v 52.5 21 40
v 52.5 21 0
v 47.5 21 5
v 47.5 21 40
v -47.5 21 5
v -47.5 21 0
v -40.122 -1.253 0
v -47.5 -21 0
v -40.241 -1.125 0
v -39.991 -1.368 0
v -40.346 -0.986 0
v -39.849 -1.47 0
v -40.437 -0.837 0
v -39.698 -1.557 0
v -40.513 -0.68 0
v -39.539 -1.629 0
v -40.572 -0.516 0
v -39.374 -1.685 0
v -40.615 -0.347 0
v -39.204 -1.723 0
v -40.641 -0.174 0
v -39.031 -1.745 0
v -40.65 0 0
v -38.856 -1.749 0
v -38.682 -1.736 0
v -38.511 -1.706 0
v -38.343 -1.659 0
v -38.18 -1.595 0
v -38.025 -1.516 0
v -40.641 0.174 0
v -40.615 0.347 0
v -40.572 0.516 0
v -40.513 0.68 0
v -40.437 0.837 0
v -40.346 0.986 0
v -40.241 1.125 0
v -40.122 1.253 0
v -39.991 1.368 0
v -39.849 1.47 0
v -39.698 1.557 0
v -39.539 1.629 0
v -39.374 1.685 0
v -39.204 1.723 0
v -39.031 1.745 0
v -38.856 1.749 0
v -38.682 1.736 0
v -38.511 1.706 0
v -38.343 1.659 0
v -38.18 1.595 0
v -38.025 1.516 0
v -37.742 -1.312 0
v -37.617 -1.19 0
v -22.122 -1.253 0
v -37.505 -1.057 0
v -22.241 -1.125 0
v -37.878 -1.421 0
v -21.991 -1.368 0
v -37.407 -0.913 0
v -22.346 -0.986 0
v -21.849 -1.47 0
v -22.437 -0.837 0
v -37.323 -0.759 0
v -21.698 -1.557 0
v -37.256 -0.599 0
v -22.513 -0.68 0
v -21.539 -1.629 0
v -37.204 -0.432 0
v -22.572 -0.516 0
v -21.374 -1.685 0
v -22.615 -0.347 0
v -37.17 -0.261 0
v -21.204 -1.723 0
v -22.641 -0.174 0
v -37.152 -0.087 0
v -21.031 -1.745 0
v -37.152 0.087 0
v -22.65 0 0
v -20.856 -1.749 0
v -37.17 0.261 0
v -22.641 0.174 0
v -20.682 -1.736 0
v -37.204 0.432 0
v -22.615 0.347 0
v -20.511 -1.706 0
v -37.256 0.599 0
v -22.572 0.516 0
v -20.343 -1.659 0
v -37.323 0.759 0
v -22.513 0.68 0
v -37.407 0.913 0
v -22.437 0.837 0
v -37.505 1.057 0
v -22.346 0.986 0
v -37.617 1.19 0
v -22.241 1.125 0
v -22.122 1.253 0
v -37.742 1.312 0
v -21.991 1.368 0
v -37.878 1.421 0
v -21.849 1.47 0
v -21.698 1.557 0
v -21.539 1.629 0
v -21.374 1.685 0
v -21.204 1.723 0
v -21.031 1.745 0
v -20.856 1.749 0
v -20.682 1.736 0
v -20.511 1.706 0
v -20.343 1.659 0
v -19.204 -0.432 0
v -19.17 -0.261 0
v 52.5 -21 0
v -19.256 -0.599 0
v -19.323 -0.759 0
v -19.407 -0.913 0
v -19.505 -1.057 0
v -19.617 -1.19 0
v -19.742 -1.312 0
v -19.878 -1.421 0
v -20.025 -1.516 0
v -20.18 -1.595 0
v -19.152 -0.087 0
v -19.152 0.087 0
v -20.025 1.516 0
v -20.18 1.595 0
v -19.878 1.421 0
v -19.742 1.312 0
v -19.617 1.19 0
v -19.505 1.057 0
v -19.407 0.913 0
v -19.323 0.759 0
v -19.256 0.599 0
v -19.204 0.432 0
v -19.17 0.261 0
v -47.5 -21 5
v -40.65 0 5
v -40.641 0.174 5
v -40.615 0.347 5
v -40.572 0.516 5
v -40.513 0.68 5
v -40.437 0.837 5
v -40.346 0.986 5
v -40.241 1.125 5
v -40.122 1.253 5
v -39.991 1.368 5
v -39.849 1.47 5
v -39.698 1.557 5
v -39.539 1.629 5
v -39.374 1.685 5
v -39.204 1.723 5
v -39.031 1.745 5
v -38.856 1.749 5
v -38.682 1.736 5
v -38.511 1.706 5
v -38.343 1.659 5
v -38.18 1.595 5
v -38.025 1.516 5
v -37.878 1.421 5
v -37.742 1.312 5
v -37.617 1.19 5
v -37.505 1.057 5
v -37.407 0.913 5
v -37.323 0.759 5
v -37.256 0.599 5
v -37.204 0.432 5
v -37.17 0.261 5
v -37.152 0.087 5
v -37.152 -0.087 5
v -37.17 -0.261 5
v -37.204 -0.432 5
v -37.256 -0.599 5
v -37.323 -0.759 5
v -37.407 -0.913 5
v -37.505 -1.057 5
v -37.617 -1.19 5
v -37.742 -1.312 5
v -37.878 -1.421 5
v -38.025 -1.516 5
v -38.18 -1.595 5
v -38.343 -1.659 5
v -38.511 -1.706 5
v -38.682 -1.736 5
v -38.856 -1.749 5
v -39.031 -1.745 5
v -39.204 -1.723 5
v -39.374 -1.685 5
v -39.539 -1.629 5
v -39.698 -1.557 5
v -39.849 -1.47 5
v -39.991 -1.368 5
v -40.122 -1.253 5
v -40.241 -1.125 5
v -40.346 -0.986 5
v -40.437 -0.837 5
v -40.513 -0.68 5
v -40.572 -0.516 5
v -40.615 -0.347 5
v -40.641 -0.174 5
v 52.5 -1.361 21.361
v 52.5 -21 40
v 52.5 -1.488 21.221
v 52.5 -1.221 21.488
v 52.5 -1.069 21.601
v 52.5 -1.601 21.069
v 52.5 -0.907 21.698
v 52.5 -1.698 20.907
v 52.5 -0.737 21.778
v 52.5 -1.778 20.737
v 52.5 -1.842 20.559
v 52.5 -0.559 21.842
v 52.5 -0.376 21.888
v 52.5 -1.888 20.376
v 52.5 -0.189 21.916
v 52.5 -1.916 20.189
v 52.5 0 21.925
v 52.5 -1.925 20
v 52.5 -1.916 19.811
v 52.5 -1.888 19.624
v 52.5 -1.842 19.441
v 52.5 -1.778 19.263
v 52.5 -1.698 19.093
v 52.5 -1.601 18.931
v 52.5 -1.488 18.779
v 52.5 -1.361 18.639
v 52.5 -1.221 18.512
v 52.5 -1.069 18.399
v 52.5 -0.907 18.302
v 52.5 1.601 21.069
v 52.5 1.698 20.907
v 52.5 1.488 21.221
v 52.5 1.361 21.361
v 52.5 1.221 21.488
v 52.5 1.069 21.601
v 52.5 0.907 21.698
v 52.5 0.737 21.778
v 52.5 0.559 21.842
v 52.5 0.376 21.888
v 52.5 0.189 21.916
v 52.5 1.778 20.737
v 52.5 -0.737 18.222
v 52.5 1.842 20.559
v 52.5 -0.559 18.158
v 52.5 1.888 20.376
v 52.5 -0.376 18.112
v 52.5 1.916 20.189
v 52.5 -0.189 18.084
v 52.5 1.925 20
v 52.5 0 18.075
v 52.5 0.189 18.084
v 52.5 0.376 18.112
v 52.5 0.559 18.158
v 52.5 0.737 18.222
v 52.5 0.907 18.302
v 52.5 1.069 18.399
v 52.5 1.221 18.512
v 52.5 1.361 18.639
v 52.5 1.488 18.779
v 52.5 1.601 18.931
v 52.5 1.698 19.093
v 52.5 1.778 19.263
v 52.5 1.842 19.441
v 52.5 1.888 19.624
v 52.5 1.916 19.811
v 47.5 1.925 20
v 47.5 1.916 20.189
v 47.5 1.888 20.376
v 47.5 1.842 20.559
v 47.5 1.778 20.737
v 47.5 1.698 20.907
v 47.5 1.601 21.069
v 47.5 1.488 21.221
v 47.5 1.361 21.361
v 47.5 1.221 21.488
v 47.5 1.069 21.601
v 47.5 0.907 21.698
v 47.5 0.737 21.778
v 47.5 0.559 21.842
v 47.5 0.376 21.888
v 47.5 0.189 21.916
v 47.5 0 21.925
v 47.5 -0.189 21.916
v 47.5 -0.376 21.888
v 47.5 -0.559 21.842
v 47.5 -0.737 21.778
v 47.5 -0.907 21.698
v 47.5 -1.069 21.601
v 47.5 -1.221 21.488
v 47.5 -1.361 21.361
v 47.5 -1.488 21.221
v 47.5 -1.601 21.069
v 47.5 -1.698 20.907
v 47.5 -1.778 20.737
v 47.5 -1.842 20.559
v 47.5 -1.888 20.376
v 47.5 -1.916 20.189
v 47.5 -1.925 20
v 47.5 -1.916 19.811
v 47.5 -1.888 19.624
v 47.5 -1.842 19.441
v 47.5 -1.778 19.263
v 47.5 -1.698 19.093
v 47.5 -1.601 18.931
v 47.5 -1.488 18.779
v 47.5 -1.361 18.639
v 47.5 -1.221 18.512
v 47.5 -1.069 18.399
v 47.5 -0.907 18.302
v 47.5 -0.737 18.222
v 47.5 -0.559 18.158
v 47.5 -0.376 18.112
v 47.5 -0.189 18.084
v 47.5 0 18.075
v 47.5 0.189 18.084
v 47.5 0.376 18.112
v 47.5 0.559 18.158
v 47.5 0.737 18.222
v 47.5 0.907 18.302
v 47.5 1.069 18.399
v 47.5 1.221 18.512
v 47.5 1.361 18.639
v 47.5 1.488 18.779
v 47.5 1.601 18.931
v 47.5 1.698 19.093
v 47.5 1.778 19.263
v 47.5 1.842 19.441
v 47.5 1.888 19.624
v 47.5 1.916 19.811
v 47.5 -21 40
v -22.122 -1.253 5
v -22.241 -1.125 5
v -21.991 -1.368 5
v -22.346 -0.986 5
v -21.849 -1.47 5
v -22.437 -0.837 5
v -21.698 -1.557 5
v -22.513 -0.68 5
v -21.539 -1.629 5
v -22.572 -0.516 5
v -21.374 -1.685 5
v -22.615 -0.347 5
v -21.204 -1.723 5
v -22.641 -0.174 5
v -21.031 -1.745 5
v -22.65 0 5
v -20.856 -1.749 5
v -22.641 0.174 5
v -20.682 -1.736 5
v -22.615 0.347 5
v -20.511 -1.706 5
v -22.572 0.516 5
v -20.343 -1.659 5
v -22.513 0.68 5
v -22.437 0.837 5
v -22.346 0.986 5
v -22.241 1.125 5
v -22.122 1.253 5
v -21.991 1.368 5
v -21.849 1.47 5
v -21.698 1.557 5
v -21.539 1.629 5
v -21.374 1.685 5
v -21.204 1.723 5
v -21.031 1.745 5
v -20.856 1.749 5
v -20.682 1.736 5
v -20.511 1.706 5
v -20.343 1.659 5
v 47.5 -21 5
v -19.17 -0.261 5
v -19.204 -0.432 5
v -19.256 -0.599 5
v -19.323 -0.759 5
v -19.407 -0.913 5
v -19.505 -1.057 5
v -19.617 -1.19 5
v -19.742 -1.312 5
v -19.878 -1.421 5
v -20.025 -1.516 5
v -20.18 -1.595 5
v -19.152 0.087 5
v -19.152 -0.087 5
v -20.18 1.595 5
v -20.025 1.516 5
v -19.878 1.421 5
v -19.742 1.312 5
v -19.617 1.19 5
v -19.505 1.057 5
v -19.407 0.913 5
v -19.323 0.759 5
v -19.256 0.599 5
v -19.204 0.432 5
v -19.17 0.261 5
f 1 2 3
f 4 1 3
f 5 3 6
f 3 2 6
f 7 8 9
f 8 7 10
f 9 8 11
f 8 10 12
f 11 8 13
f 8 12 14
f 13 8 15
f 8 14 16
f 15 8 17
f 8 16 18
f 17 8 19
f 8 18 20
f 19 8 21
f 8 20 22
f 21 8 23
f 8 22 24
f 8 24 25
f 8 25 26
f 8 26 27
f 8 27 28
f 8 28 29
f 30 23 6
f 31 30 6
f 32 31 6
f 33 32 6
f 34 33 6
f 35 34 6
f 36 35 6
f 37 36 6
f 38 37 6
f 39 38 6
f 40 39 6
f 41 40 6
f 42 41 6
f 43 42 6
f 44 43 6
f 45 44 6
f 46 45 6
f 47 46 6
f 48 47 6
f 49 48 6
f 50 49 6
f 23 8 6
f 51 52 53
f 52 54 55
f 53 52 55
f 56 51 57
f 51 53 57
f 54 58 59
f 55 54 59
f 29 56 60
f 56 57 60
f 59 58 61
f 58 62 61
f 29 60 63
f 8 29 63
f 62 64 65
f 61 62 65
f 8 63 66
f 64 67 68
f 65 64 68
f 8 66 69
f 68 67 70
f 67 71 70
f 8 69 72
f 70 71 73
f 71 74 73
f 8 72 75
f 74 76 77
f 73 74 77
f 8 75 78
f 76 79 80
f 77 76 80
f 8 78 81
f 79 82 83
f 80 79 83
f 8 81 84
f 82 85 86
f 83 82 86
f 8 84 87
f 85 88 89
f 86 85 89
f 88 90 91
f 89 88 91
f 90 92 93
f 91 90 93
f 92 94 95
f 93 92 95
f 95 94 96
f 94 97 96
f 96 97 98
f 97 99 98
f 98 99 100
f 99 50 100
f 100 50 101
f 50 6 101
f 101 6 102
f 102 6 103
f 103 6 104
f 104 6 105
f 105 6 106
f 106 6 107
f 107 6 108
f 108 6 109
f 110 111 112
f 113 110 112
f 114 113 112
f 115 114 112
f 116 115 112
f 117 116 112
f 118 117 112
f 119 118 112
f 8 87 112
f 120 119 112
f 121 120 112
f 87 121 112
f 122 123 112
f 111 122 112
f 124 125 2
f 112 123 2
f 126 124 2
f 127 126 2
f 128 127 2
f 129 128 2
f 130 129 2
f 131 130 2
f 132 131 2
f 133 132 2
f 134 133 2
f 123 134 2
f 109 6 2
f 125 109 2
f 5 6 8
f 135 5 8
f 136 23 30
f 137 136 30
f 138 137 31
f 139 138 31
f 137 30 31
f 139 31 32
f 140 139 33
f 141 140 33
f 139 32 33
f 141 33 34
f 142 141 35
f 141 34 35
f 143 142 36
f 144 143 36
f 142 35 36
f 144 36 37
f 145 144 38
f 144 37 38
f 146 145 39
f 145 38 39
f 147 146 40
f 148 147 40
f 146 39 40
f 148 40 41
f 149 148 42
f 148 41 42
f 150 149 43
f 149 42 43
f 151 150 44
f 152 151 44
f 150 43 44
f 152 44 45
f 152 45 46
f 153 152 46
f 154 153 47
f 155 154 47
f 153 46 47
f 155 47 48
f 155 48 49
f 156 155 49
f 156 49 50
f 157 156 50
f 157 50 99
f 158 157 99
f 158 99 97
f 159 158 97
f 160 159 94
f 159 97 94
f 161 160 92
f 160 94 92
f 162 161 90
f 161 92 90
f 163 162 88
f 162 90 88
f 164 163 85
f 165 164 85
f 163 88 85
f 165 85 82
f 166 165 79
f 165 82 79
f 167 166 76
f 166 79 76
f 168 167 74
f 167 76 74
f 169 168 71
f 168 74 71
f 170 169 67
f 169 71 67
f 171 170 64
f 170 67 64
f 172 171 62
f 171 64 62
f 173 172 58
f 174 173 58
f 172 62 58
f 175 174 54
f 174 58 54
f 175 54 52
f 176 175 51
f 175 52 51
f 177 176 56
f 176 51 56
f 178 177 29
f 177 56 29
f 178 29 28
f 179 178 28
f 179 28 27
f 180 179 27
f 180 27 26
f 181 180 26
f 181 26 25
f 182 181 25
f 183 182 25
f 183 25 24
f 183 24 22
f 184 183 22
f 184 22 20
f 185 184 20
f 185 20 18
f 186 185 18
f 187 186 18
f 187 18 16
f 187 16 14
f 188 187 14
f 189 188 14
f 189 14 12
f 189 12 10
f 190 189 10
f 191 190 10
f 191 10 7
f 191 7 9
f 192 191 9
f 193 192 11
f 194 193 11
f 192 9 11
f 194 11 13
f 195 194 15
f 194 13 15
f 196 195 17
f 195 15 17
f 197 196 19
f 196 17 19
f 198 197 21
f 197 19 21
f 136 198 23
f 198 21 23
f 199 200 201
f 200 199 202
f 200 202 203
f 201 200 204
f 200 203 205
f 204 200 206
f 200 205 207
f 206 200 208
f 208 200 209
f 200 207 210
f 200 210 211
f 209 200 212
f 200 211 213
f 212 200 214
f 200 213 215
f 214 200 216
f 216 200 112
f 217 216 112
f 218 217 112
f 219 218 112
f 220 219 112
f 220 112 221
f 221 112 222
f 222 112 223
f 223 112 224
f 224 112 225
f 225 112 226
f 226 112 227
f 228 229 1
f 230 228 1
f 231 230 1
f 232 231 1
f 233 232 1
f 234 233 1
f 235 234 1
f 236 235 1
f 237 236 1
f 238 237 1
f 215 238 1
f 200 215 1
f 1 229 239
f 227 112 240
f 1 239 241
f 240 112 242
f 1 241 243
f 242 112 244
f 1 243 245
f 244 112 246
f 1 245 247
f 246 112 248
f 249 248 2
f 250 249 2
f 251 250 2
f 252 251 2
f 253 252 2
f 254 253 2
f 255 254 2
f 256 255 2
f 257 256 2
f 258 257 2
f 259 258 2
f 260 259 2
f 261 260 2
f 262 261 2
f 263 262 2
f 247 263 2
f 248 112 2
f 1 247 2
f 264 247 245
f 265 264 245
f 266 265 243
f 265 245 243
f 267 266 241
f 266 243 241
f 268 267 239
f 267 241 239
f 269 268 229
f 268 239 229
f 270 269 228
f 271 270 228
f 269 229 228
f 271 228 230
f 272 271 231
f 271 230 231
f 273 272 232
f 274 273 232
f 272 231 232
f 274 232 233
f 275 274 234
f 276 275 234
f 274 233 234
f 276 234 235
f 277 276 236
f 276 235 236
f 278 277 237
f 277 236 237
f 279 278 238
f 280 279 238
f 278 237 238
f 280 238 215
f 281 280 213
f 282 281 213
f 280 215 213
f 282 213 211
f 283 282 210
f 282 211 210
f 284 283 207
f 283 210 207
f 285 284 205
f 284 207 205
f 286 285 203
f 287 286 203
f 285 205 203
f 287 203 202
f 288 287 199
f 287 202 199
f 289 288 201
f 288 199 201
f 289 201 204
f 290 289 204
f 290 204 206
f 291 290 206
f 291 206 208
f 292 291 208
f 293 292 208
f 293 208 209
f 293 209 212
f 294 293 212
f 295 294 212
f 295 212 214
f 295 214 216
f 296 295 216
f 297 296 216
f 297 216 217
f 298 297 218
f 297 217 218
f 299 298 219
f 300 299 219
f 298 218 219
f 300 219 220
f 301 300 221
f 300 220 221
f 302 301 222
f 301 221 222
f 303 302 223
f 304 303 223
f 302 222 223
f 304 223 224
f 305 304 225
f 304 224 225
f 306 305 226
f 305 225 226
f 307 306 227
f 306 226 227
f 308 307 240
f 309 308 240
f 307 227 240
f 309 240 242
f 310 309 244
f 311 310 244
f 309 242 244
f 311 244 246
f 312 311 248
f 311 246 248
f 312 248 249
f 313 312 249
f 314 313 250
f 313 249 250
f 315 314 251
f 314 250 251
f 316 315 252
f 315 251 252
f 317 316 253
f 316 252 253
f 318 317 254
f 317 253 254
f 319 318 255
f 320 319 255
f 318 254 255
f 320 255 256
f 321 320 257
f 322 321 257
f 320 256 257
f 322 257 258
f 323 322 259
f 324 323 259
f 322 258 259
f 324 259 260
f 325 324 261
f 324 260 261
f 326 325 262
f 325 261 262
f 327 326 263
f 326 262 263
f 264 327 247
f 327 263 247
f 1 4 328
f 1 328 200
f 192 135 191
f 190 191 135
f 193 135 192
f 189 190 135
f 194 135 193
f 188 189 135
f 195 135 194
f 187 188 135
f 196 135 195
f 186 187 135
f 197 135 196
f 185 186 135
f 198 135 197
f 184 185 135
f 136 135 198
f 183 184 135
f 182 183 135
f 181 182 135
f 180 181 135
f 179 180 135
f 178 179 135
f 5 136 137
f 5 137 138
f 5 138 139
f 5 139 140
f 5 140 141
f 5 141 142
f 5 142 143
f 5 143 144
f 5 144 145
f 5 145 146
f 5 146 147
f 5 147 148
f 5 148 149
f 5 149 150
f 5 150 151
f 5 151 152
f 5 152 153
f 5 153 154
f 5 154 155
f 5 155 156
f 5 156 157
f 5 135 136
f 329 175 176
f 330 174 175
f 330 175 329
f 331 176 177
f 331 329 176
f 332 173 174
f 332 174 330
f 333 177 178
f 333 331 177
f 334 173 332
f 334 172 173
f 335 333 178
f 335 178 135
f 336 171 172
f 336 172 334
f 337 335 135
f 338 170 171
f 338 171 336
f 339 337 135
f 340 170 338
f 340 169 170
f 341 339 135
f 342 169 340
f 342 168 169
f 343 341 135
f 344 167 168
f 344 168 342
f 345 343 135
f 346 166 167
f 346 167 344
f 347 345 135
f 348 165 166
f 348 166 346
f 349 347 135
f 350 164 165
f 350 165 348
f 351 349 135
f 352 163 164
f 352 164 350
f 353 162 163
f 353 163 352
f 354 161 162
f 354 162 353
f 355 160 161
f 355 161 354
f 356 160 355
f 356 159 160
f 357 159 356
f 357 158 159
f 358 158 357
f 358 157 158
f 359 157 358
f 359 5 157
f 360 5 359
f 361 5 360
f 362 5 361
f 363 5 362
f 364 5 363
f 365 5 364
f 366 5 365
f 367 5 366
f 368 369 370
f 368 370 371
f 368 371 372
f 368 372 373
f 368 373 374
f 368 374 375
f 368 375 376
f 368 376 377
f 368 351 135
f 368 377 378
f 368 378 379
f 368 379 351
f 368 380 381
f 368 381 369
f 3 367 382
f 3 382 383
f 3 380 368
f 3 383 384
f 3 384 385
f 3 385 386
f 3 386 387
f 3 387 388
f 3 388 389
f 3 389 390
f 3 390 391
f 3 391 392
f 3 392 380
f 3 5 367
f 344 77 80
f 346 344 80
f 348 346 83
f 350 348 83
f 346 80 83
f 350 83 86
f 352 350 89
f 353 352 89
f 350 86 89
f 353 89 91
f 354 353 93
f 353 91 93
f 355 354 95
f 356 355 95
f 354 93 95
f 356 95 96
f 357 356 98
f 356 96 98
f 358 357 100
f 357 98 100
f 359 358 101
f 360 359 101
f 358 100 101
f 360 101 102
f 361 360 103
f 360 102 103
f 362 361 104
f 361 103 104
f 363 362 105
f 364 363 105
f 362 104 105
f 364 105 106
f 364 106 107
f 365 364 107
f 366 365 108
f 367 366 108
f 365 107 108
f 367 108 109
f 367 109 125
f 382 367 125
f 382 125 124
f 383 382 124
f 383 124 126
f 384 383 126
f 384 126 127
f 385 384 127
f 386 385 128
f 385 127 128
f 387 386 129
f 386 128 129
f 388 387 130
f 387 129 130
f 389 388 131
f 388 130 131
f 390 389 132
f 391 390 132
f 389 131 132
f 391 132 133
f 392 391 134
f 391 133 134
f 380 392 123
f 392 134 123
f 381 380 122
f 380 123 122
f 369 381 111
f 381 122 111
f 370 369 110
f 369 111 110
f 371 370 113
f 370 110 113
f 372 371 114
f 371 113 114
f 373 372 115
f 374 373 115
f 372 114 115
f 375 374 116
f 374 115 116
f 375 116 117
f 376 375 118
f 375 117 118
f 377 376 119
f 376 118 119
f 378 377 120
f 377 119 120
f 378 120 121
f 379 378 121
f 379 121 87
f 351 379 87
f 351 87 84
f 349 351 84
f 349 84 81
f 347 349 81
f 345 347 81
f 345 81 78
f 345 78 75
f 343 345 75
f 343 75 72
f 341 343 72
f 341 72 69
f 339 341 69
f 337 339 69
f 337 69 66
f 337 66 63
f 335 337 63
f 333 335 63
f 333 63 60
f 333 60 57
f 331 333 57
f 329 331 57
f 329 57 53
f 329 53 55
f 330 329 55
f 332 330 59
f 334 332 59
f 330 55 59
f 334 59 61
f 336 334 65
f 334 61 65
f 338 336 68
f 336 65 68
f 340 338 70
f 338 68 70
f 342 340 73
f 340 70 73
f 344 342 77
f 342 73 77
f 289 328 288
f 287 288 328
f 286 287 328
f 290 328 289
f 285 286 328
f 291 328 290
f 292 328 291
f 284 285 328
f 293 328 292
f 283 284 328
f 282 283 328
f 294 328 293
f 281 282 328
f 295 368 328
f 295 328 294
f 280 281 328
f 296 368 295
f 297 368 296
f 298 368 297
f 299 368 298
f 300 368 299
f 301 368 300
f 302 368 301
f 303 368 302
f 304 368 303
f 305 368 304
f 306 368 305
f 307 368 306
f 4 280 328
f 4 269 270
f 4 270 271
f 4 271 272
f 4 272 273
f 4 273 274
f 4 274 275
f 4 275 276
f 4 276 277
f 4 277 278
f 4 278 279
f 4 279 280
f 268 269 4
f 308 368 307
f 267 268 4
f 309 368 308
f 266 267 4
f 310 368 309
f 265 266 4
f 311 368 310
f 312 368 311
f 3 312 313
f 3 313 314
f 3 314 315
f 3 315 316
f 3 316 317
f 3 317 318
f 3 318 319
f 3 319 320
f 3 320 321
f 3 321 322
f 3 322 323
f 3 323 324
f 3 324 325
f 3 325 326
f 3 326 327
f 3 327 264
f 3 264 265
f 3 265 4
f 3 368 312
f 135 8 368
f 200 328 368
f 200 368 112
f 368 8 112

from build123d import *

# Parameters (mm, degrees)
F0_W     = 5
F0_H     = 42
F1_DEPTH = 40
F2_DEPTH = 5
F4_DEPTH = 5


with BuildPart() as f1:
    # F0 (on Top) → F1 (new body)
    with BuildSketch(Plane.XY):
        with Locations((50, 0)):
            Rectangle(F0_W, F0_H)
    extrude(amount=F1_DEPTH)

    # F0 (on Top) → F2 (join)
    with BuildSketch(Plane.XY):
        Polygon((47.5, 21), (-47.5, 21), (-47.5, 0), (-47.5, -21), (47.5, -21), align=None)
        with BuildLine():
            ThreePointArc((-37.15, 0), (-38.9, -1.75), (-40.65, 0))
            ThreePointArc((-40.65, 0), (-38.9, 1.75), (-37.15, 0))
        make_face(mode=Mode.SUBTRACT)
        with BuildLine():
            ThreePointArc((-19.15, 0), (-20.9, -1.75), (-22.65, 0))
            ThreePointArc((-22.65, 0), (-20.9, 1.75), (-19.15, 0))
        make_face(mode=Mode.SUBTRACT)
    extrude(amount=F2_DEPTH)

    # F3 (on face) → F4 (cut)
    with BuildSketch(Plane.YZ.offset(52.5)):
        with BuildLine():
            ThreePointArc((1.925, 20), (-1.361181, 21.361181), (0, 18.075))
            ThreePointArc((0, 18.075), (1.361181, 18.638819), (1.925, 20))
        make_face()
    extrude(amount=-F4_DEPTH, mode=Mode.SUBTRACT)


solid = f1.part
